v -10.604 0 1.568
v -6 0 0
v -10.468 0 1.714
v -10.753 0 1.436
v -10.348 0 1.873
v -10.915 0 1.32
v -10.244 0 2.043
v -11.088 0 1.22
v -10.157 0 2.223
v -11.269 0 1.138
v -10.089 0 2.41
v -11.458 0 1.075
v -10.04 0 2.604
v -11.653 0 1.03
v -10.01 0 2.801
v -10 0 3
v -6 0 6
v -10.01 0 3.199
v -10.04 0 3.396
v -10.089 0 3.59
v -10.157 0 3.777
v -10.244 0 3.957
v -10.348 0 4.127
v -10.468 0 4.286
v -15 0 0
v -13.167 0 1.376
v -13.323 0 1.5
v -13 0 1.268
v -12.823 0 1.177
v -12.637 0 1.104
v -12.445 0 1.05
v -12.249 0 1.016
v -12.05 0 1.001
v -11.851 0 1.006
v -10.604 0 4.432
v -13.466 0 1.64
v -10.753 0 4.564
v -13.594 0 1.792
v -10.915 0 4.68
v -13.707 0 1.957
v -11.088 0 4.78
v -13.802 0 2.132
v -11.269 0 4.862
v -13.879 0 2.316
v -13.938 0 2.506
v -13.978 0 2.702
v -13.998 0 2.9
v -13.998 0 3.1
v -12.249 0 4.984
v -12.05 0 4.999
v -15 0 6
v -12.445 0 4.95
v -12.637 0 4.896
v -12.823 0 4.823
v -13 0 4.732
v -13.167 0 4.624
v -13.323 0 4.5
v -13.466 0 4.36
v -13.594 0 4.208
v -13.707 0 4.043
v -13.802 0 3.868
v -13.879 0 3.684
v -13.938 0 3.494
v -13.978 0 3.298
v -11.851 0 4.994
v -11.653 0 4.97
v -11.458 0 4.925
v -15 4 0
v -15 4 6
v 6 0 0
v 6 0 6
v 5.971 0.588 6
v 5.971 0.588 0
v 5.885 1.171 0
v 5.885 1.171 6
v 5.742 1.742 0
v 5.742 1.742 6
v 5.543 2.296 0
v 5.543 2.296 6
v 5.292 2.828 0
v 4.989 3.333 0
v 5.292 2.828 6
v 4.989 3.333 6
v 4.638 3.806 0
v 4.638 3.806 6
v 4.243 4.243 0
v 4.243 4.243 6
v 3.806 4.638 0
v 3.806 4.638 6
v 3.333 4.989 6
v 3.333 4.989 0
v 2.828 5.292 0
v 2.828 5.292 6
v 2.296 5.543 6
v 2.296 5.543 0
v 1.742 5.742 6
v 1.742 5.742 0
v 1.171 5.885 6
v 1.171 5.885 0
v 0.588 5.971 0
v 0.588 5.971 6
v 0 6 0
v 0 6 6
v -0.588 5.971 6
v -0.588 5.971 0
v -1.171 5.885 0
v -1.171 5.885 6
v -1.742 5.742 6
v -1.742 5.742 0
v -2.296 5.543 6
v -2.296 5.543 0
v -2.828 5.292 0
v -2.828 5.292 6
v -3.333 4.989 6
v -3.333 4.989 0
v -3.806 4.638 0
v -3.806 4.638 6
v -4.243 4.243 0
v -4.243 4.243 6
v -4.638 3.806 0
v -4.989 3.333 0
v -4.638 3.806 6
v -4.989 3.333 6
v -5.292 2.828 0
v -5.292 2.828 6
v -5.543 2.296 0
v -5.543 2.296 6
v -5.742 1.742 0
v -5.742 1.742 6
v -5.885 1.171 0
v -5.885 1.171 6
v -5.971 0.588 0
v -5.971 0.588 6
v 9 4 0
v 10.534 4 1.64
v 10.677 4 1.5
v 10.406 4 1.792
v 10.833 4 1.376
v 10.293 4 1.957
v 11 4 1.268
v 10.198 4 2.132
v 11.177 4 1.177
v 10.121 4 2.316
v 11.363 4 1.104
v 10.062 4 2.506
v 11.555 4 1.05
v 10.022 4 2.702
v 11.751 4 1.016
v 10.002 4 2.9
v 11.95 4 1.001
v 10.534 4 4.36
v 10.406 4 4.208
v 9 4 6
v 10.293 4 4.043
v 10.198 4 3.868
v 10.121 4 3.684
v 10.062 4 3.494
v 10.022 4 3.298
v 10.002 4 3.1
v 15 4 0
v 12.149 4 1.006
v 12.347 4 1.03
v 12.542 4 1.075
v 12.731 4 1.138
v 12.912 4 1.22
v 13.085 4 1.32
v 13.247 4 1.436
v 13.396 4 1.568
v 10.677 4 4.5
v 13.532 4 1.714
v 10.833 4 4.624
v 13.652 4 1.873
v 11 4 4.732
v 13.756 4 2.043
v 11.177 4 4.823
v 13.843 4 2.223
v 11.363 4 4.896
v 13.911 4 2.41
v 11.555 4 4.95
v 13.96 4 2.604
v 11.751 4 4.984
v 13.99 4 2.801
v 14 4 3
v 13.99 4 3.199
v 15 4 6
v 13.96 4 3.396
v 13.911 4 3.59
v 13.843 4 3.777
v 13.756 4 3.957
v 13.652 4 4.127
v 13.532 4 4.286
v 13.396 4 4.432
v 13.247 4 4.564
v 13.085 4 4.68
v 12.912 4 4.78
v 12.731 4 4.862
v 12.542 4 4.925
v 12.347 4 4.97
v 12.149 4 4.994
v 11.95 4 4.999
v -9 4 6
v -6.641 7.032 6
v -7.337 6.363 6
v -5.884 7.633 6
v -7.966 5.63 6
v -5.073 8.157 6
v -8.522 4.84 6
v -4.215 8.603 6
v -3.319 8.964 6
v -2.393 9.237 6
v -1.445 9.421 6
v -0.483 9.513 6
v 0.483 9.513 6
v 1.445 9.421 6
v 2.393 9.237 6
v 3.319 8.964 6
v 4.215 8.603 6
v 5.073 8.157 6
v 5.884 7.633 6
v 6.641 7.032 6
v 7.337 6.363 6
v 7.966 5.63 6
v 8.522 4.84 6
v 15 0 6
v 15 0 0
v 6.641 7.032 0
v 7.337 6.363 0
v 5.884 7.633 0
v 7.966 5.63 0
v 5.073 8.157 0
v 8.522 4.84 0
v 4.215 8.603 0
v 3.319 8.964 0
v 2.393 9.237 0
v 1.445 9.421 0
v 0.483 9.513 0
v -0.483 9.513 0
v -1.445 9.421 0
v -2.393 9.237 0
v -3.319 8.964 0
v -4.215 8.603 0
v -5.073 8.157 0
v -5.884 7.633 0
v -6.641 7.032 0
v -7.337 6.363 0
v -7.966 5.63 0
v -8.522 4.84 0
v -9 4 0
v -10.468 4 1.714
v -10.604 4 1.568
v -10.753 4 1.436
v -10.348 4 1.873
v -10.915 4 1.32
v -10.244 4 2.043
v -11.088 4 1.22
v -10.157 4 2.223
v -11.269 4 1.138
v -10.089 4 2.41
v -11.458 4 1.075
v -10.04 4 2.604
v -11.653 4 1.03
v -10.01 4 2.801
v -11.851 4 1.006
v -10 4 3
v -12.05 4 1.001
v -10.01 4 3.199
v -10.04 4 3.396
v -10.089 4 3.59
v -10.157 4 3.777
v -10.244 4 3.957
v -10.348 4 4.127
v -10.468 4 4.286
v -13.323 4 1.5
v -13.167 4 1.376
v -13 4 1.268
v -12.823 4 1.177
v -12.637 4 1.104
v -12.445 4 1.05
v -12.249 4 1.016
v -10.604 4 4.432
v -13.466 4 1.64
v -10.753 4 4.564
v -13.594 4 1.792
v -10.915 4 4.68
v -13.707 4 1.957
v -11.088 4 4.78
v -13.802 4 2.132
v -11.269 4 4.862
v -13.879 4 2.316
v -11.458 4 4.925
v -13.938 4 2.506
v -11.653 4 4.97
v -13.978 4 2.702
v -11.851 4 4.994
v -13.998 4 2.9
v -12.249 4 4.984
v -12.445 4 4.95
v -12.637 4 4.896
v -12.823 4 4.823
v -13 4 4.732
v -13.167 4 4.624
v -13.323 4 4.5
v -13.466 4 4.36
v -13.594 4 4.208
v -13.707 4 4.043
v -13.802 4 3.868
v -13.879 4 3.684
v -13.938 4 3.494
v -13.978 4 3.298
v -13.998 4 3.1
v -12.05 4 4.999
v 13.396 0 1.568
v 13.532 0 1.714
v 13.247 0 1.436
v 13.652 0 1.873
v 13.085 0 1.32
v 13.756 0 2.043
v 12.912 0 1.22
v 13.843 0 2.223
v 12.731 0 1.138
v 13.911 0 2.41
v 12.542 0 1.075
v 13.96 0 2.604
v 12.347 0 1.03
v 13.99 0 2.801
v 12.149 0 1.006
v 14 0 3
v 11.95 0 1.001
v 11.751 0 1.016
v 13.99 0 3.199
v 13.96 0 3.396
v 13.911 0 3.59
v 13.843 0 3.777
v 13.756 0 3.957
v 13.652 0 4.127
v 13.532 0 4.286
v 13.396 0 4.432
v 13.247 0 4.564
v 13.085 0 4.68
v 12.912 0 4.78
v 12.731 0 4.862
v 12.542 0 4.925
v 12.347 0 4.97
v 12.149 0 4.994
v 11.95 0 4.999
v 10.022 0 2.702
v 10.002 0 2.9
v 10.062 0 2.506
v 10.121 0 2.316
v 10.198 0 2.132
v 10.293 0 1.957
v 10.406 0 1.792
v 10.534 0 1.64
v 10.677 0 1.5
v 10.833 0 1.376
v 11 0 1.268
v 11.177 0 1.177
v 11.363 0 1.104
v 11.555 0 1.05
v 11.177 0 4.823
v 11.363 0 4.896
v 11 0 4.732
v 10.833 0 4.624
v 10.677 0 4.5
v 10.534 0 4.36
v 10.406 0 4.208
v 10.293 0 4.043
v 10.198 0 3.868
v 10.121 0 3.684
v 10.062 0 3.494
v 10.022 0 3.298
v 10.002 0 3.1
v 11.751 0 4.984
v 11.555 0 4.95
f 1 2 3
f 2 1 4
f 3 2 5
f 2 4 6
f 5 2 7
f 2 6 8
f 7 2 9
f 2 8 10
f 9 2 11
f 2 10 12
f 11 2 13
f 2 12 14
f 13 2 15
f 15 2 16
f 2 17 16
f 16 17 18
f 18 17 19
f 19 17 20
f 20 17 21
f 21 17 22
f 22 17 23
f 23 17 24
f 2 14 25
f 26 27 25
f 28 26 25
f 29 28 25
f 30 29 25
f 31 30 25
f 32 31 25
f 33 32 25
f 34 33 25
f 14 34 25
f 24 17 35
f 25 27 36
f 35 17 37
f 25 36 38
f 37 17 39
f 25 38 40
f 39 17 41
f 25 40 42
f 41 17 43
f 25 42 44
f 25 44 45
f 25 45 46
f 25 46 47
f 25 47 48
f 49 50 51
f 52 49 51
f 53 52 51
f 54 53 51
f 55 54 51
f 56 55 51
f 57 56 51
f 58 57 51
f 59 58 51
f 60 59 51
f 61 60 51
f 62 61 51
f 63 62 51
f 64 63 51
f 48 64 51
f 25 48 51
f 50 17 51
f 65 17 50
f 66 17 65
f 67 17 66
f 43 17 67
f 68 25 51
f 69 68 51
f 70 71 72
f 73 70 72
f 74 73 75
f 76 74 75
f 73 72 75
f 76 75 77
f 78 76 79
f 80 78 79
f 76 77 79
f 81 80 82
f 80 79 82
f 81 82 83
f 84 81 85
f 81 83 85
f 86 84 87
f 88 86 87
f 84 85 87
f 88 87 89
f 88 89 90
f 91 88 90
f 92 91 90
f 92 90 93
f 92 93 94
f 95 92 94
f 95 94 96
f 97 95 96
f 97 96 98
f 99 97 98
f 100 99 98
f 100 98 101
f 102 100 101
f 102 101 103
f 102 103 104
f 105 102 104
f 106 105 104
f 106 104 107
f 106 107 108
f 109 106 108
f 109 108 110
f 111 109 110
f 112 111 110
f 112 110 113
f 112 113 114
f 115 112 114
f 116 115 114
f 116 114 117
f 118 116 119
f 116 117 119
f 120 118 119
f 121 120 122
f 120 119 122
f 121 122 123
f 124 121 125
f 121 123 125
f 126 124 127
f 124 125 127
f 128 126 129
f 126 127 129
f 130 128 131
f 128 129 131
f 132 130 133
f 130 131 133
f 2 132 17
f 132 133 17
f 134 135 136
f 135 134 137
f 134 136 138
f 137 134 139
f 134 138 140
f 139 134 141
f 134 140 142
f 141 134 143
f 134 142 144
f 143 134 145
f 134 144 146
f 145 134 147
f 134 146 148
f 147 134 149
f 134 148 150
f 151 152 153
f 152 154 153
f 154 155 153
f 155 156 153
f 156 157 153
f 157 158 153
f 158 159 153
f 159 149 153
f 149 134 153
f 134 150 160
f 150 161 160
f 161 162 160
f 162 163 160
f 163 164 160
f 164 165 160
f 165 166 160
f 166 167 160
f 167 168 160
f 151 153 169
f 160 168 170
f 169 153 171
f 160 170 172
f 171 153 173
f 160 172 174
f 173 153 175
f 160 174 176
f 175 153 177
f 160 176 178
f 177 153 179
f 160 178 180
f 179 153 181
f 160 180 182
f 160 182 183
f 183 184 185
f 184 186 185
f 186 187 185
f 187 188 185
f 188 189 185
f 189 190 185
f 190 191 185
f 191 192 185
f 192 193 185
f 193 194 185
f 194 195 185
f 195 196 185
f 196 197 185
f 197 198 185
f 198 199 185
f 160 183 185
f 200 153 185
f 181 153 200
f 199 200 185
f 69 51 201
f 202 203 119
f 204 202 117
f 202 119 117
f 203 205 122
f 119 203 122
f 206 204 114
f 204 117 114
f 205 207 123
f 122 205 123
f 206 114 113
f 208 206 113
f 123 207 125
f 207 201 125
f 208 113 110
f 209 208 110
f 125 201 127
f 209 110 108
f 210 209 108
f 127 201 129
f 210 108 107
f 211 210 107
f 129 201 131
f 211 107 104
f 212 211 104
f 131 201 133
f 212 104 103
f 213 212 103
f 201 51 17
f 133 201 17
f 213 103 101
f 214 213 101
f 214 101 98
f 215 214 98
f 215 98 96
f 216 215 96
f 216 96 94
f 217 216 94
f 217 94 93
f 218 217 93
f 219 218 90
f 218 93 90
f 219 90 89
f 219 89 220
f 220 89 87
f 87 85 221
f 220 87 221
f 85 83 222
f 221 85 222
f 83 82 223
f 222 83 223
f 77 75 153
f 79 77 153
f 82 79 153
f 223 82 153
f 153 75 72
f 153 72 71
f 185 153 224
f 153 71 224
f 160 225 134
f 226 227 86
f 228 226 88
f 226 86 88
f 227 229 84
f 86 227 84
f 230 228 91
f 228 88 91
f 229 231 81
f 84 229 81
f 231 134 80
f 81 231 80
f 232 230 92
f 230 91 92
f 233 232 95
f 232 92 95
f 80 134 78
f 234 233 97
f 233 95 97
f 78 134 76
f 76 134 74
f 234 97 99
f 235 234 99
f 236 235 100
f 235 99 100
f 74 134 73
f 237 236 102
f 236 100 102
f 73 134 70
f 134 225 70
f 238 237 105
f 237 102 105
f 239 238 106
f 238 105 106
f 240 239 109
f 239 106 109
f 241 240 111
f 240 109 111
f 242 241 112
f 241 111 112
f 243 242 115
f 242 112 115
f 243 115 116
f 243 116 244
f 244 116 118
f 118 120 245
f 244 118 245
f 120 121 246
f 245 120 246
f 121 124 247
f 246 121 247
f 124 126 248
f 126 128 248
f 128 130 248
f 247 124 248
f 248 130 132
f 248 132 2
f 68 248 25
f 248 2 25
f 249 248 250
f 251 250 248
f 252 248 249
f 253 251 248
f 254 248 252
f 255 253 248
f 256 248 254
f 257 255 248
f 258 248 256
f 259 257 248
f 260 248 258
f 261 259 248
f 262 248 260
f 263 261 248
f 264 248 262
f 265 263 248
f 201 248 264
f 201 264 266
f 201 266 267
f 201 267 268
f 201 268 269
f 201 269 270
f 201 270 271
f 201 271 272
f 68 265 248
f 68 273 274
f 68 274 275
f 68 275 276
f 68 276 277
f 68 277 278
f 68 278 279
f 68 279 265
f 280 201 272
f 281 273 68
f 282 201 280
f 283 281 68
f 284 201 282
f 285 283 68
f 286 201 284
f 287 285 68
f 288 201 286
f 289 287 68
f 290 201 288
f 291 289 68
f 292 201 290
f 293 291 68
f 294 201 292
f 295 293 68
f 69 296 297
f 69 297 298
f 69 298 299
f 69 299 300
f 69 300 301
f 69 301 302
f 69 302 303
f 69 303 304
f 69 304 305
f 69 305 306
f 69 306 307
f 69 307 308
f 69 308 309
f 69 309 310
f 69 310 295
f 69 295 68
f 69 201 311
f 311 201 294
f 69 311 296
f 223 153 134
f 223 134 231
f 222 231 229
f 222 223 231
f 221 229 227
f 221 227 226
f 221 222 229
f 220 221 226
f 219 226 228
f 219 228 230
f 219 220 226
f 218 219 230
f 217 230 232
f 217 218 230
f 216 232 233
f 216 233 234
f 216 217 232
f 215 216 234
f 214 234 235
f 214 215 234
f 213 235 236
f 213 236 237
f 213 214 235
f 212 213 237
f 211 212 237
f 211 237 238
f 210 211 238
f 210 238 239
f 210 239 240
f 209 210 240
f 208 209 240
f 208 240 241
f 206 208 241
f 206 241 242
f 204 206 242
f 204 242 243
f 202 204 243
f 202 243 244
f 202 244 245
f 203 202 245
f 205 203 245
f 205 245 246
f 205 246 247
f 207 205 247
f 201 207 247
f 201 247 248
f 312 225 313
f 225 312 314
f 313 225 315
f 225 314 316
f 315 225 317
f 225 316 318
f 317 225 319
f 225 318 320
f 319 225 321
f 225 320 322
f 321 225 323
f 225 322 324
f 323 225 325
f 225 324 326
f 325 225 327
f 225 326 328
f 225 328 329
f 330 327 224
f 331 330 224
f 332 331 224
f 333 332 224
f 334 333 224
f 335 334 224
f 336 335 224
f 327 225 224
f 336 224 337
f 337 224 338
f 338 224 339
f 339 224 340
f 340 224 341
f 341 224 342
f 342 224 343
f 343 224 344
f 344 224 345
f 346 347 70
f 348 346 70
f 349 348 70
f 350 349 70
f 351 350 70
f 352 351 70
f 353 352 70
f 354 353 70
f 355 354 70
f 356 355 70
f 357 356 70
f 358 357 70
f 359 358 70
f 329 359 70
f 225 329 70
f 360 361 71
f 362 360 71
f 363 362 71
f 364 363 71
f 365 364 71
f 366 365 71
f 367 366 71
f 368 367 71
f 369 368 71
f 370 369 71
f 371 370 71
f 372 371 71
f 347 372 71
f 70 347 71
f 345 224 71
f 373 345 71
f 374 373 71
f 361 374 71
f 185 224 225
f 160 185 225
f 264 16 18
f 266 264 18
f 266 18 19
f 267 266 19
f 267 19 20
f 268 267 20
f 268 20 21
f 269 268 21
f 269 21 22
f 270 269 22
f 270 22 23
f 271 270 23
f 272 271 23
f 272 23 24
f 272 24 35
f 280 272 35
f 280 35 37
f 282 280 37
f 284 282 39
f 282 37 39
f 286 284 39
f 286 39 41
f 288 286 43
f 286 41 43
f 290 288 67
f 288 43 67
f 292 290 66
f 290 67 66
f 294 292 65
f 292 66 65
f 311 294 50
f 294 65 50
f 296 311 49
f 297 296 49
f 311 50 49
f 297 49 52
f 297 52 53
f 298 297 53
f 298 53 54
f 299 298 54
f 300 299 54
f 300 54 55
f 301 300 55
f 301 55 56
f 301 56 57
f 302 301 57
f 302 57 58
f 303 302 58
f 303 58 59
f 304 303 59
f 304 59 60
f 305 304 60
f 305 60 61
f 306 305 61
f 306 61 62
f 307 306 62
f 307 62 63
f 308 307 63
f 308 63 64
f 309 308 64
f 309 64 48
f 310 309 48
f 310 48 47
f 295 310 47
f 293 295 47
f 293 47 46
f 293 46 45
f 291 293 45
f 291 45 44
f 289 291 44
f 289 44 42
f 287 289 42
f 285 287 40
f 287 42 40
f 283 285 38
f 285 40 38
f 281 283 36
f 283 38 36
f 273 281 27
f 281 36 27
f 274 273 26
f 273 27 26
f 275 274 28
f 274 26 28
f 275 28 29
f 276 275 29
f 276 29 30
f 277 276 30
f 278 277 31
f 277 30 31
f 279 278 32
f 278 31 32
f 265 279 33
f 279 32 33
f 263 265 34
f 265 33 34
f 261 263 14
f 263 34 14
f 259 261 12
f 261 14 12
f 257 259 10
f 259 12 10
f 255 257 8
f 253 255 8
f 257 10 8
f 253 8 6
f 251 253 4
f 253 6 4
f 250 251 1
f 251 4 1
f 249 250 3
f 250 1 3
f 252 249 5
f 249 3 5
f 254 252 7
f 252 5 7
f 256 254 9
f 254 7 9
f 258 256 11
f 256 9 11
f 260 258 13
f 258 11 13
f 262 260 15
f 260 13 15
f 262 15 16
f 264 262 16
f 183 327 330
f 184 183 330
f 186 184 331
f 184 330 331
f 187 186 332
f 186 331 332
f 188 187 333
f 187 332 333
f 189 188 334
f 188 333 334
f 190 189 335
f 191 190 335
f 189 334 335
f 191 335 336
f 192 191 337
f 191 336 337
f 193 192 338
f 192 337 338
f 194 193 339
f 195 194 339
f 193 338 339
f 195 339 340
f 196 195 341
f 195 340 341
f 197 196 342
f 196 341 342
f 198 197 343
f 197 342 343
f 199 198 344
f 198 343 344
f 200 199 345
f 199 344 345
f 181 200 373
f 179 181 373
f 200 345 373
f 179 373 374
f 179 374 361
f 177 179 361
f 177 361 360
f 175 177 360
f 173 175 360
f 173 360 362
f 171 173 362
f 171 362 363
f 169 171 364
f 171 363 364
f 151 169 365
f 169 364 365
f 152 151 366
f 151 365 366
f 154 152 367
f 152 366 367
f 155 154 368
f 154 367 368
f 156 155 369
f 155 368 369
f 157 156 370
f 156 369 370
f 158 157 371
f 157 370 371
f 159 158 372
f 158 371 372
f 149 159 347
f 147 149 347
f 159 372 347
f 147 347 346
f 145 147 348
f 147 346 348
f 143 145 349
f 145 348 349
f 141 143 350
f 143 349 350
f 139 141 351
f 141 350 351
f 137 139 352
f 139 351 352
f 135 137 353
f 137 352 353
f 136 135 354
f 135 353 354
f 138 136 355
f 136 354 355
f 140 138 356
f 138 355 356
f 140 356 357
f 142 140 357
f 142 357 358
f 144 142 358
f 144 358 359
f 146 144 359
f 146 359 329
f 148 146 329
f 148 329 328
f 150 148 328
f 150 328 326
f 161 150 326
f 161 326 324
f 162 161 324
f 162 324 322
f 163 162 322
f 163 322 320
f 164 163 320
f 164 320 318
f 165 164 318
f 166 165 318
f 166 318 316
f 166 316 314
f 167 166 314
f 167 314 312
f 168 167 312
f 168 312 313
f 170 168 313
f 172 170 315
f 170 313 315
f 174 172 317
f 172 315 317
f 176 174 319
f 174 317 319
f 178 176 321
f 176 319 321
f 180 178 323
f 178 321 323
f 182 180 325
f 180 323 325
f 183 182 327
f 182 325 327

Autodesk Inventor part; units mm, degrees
ref_plane "YZ Plane" through (0, 0, 0) normal (1, 0, 0) x (0, 1, 0)
ref_plane "XZ Plane" through (0, 0, 0) normal (0, 1, 0) x (-1, 0, 0)
ref_plane "XY Plane" through (0, 0, 0) normal (0, 0, 1) x (1, 0, 0)
sketch "Sketch1" plane through (0, 0, 0) normal (0, 1, 0) x (-1, 0, 0)
  line L0 (15, 6) -> (-15, 6)
  line L1 (-15, 6) -> (-15, 0)
  line L2 (-15, 0) -> (15, 0)
  line L3 (15, 0) -> (15, 6)
  point P0 (0, 0)
  dimension "d0" = 30
extrude "Extrusion1" add sketch "Sketch1" along normal blind 10
sketch "Sketch2" plane through (-15, 0, 6) normal (0, 0, 1) x (1, 0, 0)
  circle A0 centre (15, 0) radius 6
  line L0 (30, 10) -> (0, 10) projected
  line L1 (30, 10) -> (24, 10)
  line L2 (24, 10) -> (24, 4)
  line L3 (24, 4) -> (30, 4)
  line L4 (30, 4) -> (30, 10)
  line L5 (0, 0) -> (0, 10) projected
  line L6 (0, 10) -> (6, 10)
  line L7 (6, 10) -> (6, 4)
  line L8 (6, 4) -> (0, 4)
  line L9 (0, 4) -> (0, 10)
  arc A1 (24, 4) -> (6, 4) centre (15, -0.5678) ccw
  line L10 (6, 10) -> (24, 10)
  dimension "d3" = 12
  dimension "d4" = 6
  dimension "d5" = 6
  dimension "d6" = 6
extrude "Extrusion2" cut sketch "Sketch2" against normal blind 10
sketch "Sketch3" plane through (0, 0, 0) normal (0, -1, 0) x (1, 0, 0)
  circle A0 centre (-12, 3) radius 2
  circle A1 centre (12, 3) radius 2
  point P0 (0, 0)
  dimension "d9" = 4
  dimension "d10" = 4
extrude "Extrusion3" cut sketch "Sketch3" against normal blind 10
properties part number "printHeadMount"
